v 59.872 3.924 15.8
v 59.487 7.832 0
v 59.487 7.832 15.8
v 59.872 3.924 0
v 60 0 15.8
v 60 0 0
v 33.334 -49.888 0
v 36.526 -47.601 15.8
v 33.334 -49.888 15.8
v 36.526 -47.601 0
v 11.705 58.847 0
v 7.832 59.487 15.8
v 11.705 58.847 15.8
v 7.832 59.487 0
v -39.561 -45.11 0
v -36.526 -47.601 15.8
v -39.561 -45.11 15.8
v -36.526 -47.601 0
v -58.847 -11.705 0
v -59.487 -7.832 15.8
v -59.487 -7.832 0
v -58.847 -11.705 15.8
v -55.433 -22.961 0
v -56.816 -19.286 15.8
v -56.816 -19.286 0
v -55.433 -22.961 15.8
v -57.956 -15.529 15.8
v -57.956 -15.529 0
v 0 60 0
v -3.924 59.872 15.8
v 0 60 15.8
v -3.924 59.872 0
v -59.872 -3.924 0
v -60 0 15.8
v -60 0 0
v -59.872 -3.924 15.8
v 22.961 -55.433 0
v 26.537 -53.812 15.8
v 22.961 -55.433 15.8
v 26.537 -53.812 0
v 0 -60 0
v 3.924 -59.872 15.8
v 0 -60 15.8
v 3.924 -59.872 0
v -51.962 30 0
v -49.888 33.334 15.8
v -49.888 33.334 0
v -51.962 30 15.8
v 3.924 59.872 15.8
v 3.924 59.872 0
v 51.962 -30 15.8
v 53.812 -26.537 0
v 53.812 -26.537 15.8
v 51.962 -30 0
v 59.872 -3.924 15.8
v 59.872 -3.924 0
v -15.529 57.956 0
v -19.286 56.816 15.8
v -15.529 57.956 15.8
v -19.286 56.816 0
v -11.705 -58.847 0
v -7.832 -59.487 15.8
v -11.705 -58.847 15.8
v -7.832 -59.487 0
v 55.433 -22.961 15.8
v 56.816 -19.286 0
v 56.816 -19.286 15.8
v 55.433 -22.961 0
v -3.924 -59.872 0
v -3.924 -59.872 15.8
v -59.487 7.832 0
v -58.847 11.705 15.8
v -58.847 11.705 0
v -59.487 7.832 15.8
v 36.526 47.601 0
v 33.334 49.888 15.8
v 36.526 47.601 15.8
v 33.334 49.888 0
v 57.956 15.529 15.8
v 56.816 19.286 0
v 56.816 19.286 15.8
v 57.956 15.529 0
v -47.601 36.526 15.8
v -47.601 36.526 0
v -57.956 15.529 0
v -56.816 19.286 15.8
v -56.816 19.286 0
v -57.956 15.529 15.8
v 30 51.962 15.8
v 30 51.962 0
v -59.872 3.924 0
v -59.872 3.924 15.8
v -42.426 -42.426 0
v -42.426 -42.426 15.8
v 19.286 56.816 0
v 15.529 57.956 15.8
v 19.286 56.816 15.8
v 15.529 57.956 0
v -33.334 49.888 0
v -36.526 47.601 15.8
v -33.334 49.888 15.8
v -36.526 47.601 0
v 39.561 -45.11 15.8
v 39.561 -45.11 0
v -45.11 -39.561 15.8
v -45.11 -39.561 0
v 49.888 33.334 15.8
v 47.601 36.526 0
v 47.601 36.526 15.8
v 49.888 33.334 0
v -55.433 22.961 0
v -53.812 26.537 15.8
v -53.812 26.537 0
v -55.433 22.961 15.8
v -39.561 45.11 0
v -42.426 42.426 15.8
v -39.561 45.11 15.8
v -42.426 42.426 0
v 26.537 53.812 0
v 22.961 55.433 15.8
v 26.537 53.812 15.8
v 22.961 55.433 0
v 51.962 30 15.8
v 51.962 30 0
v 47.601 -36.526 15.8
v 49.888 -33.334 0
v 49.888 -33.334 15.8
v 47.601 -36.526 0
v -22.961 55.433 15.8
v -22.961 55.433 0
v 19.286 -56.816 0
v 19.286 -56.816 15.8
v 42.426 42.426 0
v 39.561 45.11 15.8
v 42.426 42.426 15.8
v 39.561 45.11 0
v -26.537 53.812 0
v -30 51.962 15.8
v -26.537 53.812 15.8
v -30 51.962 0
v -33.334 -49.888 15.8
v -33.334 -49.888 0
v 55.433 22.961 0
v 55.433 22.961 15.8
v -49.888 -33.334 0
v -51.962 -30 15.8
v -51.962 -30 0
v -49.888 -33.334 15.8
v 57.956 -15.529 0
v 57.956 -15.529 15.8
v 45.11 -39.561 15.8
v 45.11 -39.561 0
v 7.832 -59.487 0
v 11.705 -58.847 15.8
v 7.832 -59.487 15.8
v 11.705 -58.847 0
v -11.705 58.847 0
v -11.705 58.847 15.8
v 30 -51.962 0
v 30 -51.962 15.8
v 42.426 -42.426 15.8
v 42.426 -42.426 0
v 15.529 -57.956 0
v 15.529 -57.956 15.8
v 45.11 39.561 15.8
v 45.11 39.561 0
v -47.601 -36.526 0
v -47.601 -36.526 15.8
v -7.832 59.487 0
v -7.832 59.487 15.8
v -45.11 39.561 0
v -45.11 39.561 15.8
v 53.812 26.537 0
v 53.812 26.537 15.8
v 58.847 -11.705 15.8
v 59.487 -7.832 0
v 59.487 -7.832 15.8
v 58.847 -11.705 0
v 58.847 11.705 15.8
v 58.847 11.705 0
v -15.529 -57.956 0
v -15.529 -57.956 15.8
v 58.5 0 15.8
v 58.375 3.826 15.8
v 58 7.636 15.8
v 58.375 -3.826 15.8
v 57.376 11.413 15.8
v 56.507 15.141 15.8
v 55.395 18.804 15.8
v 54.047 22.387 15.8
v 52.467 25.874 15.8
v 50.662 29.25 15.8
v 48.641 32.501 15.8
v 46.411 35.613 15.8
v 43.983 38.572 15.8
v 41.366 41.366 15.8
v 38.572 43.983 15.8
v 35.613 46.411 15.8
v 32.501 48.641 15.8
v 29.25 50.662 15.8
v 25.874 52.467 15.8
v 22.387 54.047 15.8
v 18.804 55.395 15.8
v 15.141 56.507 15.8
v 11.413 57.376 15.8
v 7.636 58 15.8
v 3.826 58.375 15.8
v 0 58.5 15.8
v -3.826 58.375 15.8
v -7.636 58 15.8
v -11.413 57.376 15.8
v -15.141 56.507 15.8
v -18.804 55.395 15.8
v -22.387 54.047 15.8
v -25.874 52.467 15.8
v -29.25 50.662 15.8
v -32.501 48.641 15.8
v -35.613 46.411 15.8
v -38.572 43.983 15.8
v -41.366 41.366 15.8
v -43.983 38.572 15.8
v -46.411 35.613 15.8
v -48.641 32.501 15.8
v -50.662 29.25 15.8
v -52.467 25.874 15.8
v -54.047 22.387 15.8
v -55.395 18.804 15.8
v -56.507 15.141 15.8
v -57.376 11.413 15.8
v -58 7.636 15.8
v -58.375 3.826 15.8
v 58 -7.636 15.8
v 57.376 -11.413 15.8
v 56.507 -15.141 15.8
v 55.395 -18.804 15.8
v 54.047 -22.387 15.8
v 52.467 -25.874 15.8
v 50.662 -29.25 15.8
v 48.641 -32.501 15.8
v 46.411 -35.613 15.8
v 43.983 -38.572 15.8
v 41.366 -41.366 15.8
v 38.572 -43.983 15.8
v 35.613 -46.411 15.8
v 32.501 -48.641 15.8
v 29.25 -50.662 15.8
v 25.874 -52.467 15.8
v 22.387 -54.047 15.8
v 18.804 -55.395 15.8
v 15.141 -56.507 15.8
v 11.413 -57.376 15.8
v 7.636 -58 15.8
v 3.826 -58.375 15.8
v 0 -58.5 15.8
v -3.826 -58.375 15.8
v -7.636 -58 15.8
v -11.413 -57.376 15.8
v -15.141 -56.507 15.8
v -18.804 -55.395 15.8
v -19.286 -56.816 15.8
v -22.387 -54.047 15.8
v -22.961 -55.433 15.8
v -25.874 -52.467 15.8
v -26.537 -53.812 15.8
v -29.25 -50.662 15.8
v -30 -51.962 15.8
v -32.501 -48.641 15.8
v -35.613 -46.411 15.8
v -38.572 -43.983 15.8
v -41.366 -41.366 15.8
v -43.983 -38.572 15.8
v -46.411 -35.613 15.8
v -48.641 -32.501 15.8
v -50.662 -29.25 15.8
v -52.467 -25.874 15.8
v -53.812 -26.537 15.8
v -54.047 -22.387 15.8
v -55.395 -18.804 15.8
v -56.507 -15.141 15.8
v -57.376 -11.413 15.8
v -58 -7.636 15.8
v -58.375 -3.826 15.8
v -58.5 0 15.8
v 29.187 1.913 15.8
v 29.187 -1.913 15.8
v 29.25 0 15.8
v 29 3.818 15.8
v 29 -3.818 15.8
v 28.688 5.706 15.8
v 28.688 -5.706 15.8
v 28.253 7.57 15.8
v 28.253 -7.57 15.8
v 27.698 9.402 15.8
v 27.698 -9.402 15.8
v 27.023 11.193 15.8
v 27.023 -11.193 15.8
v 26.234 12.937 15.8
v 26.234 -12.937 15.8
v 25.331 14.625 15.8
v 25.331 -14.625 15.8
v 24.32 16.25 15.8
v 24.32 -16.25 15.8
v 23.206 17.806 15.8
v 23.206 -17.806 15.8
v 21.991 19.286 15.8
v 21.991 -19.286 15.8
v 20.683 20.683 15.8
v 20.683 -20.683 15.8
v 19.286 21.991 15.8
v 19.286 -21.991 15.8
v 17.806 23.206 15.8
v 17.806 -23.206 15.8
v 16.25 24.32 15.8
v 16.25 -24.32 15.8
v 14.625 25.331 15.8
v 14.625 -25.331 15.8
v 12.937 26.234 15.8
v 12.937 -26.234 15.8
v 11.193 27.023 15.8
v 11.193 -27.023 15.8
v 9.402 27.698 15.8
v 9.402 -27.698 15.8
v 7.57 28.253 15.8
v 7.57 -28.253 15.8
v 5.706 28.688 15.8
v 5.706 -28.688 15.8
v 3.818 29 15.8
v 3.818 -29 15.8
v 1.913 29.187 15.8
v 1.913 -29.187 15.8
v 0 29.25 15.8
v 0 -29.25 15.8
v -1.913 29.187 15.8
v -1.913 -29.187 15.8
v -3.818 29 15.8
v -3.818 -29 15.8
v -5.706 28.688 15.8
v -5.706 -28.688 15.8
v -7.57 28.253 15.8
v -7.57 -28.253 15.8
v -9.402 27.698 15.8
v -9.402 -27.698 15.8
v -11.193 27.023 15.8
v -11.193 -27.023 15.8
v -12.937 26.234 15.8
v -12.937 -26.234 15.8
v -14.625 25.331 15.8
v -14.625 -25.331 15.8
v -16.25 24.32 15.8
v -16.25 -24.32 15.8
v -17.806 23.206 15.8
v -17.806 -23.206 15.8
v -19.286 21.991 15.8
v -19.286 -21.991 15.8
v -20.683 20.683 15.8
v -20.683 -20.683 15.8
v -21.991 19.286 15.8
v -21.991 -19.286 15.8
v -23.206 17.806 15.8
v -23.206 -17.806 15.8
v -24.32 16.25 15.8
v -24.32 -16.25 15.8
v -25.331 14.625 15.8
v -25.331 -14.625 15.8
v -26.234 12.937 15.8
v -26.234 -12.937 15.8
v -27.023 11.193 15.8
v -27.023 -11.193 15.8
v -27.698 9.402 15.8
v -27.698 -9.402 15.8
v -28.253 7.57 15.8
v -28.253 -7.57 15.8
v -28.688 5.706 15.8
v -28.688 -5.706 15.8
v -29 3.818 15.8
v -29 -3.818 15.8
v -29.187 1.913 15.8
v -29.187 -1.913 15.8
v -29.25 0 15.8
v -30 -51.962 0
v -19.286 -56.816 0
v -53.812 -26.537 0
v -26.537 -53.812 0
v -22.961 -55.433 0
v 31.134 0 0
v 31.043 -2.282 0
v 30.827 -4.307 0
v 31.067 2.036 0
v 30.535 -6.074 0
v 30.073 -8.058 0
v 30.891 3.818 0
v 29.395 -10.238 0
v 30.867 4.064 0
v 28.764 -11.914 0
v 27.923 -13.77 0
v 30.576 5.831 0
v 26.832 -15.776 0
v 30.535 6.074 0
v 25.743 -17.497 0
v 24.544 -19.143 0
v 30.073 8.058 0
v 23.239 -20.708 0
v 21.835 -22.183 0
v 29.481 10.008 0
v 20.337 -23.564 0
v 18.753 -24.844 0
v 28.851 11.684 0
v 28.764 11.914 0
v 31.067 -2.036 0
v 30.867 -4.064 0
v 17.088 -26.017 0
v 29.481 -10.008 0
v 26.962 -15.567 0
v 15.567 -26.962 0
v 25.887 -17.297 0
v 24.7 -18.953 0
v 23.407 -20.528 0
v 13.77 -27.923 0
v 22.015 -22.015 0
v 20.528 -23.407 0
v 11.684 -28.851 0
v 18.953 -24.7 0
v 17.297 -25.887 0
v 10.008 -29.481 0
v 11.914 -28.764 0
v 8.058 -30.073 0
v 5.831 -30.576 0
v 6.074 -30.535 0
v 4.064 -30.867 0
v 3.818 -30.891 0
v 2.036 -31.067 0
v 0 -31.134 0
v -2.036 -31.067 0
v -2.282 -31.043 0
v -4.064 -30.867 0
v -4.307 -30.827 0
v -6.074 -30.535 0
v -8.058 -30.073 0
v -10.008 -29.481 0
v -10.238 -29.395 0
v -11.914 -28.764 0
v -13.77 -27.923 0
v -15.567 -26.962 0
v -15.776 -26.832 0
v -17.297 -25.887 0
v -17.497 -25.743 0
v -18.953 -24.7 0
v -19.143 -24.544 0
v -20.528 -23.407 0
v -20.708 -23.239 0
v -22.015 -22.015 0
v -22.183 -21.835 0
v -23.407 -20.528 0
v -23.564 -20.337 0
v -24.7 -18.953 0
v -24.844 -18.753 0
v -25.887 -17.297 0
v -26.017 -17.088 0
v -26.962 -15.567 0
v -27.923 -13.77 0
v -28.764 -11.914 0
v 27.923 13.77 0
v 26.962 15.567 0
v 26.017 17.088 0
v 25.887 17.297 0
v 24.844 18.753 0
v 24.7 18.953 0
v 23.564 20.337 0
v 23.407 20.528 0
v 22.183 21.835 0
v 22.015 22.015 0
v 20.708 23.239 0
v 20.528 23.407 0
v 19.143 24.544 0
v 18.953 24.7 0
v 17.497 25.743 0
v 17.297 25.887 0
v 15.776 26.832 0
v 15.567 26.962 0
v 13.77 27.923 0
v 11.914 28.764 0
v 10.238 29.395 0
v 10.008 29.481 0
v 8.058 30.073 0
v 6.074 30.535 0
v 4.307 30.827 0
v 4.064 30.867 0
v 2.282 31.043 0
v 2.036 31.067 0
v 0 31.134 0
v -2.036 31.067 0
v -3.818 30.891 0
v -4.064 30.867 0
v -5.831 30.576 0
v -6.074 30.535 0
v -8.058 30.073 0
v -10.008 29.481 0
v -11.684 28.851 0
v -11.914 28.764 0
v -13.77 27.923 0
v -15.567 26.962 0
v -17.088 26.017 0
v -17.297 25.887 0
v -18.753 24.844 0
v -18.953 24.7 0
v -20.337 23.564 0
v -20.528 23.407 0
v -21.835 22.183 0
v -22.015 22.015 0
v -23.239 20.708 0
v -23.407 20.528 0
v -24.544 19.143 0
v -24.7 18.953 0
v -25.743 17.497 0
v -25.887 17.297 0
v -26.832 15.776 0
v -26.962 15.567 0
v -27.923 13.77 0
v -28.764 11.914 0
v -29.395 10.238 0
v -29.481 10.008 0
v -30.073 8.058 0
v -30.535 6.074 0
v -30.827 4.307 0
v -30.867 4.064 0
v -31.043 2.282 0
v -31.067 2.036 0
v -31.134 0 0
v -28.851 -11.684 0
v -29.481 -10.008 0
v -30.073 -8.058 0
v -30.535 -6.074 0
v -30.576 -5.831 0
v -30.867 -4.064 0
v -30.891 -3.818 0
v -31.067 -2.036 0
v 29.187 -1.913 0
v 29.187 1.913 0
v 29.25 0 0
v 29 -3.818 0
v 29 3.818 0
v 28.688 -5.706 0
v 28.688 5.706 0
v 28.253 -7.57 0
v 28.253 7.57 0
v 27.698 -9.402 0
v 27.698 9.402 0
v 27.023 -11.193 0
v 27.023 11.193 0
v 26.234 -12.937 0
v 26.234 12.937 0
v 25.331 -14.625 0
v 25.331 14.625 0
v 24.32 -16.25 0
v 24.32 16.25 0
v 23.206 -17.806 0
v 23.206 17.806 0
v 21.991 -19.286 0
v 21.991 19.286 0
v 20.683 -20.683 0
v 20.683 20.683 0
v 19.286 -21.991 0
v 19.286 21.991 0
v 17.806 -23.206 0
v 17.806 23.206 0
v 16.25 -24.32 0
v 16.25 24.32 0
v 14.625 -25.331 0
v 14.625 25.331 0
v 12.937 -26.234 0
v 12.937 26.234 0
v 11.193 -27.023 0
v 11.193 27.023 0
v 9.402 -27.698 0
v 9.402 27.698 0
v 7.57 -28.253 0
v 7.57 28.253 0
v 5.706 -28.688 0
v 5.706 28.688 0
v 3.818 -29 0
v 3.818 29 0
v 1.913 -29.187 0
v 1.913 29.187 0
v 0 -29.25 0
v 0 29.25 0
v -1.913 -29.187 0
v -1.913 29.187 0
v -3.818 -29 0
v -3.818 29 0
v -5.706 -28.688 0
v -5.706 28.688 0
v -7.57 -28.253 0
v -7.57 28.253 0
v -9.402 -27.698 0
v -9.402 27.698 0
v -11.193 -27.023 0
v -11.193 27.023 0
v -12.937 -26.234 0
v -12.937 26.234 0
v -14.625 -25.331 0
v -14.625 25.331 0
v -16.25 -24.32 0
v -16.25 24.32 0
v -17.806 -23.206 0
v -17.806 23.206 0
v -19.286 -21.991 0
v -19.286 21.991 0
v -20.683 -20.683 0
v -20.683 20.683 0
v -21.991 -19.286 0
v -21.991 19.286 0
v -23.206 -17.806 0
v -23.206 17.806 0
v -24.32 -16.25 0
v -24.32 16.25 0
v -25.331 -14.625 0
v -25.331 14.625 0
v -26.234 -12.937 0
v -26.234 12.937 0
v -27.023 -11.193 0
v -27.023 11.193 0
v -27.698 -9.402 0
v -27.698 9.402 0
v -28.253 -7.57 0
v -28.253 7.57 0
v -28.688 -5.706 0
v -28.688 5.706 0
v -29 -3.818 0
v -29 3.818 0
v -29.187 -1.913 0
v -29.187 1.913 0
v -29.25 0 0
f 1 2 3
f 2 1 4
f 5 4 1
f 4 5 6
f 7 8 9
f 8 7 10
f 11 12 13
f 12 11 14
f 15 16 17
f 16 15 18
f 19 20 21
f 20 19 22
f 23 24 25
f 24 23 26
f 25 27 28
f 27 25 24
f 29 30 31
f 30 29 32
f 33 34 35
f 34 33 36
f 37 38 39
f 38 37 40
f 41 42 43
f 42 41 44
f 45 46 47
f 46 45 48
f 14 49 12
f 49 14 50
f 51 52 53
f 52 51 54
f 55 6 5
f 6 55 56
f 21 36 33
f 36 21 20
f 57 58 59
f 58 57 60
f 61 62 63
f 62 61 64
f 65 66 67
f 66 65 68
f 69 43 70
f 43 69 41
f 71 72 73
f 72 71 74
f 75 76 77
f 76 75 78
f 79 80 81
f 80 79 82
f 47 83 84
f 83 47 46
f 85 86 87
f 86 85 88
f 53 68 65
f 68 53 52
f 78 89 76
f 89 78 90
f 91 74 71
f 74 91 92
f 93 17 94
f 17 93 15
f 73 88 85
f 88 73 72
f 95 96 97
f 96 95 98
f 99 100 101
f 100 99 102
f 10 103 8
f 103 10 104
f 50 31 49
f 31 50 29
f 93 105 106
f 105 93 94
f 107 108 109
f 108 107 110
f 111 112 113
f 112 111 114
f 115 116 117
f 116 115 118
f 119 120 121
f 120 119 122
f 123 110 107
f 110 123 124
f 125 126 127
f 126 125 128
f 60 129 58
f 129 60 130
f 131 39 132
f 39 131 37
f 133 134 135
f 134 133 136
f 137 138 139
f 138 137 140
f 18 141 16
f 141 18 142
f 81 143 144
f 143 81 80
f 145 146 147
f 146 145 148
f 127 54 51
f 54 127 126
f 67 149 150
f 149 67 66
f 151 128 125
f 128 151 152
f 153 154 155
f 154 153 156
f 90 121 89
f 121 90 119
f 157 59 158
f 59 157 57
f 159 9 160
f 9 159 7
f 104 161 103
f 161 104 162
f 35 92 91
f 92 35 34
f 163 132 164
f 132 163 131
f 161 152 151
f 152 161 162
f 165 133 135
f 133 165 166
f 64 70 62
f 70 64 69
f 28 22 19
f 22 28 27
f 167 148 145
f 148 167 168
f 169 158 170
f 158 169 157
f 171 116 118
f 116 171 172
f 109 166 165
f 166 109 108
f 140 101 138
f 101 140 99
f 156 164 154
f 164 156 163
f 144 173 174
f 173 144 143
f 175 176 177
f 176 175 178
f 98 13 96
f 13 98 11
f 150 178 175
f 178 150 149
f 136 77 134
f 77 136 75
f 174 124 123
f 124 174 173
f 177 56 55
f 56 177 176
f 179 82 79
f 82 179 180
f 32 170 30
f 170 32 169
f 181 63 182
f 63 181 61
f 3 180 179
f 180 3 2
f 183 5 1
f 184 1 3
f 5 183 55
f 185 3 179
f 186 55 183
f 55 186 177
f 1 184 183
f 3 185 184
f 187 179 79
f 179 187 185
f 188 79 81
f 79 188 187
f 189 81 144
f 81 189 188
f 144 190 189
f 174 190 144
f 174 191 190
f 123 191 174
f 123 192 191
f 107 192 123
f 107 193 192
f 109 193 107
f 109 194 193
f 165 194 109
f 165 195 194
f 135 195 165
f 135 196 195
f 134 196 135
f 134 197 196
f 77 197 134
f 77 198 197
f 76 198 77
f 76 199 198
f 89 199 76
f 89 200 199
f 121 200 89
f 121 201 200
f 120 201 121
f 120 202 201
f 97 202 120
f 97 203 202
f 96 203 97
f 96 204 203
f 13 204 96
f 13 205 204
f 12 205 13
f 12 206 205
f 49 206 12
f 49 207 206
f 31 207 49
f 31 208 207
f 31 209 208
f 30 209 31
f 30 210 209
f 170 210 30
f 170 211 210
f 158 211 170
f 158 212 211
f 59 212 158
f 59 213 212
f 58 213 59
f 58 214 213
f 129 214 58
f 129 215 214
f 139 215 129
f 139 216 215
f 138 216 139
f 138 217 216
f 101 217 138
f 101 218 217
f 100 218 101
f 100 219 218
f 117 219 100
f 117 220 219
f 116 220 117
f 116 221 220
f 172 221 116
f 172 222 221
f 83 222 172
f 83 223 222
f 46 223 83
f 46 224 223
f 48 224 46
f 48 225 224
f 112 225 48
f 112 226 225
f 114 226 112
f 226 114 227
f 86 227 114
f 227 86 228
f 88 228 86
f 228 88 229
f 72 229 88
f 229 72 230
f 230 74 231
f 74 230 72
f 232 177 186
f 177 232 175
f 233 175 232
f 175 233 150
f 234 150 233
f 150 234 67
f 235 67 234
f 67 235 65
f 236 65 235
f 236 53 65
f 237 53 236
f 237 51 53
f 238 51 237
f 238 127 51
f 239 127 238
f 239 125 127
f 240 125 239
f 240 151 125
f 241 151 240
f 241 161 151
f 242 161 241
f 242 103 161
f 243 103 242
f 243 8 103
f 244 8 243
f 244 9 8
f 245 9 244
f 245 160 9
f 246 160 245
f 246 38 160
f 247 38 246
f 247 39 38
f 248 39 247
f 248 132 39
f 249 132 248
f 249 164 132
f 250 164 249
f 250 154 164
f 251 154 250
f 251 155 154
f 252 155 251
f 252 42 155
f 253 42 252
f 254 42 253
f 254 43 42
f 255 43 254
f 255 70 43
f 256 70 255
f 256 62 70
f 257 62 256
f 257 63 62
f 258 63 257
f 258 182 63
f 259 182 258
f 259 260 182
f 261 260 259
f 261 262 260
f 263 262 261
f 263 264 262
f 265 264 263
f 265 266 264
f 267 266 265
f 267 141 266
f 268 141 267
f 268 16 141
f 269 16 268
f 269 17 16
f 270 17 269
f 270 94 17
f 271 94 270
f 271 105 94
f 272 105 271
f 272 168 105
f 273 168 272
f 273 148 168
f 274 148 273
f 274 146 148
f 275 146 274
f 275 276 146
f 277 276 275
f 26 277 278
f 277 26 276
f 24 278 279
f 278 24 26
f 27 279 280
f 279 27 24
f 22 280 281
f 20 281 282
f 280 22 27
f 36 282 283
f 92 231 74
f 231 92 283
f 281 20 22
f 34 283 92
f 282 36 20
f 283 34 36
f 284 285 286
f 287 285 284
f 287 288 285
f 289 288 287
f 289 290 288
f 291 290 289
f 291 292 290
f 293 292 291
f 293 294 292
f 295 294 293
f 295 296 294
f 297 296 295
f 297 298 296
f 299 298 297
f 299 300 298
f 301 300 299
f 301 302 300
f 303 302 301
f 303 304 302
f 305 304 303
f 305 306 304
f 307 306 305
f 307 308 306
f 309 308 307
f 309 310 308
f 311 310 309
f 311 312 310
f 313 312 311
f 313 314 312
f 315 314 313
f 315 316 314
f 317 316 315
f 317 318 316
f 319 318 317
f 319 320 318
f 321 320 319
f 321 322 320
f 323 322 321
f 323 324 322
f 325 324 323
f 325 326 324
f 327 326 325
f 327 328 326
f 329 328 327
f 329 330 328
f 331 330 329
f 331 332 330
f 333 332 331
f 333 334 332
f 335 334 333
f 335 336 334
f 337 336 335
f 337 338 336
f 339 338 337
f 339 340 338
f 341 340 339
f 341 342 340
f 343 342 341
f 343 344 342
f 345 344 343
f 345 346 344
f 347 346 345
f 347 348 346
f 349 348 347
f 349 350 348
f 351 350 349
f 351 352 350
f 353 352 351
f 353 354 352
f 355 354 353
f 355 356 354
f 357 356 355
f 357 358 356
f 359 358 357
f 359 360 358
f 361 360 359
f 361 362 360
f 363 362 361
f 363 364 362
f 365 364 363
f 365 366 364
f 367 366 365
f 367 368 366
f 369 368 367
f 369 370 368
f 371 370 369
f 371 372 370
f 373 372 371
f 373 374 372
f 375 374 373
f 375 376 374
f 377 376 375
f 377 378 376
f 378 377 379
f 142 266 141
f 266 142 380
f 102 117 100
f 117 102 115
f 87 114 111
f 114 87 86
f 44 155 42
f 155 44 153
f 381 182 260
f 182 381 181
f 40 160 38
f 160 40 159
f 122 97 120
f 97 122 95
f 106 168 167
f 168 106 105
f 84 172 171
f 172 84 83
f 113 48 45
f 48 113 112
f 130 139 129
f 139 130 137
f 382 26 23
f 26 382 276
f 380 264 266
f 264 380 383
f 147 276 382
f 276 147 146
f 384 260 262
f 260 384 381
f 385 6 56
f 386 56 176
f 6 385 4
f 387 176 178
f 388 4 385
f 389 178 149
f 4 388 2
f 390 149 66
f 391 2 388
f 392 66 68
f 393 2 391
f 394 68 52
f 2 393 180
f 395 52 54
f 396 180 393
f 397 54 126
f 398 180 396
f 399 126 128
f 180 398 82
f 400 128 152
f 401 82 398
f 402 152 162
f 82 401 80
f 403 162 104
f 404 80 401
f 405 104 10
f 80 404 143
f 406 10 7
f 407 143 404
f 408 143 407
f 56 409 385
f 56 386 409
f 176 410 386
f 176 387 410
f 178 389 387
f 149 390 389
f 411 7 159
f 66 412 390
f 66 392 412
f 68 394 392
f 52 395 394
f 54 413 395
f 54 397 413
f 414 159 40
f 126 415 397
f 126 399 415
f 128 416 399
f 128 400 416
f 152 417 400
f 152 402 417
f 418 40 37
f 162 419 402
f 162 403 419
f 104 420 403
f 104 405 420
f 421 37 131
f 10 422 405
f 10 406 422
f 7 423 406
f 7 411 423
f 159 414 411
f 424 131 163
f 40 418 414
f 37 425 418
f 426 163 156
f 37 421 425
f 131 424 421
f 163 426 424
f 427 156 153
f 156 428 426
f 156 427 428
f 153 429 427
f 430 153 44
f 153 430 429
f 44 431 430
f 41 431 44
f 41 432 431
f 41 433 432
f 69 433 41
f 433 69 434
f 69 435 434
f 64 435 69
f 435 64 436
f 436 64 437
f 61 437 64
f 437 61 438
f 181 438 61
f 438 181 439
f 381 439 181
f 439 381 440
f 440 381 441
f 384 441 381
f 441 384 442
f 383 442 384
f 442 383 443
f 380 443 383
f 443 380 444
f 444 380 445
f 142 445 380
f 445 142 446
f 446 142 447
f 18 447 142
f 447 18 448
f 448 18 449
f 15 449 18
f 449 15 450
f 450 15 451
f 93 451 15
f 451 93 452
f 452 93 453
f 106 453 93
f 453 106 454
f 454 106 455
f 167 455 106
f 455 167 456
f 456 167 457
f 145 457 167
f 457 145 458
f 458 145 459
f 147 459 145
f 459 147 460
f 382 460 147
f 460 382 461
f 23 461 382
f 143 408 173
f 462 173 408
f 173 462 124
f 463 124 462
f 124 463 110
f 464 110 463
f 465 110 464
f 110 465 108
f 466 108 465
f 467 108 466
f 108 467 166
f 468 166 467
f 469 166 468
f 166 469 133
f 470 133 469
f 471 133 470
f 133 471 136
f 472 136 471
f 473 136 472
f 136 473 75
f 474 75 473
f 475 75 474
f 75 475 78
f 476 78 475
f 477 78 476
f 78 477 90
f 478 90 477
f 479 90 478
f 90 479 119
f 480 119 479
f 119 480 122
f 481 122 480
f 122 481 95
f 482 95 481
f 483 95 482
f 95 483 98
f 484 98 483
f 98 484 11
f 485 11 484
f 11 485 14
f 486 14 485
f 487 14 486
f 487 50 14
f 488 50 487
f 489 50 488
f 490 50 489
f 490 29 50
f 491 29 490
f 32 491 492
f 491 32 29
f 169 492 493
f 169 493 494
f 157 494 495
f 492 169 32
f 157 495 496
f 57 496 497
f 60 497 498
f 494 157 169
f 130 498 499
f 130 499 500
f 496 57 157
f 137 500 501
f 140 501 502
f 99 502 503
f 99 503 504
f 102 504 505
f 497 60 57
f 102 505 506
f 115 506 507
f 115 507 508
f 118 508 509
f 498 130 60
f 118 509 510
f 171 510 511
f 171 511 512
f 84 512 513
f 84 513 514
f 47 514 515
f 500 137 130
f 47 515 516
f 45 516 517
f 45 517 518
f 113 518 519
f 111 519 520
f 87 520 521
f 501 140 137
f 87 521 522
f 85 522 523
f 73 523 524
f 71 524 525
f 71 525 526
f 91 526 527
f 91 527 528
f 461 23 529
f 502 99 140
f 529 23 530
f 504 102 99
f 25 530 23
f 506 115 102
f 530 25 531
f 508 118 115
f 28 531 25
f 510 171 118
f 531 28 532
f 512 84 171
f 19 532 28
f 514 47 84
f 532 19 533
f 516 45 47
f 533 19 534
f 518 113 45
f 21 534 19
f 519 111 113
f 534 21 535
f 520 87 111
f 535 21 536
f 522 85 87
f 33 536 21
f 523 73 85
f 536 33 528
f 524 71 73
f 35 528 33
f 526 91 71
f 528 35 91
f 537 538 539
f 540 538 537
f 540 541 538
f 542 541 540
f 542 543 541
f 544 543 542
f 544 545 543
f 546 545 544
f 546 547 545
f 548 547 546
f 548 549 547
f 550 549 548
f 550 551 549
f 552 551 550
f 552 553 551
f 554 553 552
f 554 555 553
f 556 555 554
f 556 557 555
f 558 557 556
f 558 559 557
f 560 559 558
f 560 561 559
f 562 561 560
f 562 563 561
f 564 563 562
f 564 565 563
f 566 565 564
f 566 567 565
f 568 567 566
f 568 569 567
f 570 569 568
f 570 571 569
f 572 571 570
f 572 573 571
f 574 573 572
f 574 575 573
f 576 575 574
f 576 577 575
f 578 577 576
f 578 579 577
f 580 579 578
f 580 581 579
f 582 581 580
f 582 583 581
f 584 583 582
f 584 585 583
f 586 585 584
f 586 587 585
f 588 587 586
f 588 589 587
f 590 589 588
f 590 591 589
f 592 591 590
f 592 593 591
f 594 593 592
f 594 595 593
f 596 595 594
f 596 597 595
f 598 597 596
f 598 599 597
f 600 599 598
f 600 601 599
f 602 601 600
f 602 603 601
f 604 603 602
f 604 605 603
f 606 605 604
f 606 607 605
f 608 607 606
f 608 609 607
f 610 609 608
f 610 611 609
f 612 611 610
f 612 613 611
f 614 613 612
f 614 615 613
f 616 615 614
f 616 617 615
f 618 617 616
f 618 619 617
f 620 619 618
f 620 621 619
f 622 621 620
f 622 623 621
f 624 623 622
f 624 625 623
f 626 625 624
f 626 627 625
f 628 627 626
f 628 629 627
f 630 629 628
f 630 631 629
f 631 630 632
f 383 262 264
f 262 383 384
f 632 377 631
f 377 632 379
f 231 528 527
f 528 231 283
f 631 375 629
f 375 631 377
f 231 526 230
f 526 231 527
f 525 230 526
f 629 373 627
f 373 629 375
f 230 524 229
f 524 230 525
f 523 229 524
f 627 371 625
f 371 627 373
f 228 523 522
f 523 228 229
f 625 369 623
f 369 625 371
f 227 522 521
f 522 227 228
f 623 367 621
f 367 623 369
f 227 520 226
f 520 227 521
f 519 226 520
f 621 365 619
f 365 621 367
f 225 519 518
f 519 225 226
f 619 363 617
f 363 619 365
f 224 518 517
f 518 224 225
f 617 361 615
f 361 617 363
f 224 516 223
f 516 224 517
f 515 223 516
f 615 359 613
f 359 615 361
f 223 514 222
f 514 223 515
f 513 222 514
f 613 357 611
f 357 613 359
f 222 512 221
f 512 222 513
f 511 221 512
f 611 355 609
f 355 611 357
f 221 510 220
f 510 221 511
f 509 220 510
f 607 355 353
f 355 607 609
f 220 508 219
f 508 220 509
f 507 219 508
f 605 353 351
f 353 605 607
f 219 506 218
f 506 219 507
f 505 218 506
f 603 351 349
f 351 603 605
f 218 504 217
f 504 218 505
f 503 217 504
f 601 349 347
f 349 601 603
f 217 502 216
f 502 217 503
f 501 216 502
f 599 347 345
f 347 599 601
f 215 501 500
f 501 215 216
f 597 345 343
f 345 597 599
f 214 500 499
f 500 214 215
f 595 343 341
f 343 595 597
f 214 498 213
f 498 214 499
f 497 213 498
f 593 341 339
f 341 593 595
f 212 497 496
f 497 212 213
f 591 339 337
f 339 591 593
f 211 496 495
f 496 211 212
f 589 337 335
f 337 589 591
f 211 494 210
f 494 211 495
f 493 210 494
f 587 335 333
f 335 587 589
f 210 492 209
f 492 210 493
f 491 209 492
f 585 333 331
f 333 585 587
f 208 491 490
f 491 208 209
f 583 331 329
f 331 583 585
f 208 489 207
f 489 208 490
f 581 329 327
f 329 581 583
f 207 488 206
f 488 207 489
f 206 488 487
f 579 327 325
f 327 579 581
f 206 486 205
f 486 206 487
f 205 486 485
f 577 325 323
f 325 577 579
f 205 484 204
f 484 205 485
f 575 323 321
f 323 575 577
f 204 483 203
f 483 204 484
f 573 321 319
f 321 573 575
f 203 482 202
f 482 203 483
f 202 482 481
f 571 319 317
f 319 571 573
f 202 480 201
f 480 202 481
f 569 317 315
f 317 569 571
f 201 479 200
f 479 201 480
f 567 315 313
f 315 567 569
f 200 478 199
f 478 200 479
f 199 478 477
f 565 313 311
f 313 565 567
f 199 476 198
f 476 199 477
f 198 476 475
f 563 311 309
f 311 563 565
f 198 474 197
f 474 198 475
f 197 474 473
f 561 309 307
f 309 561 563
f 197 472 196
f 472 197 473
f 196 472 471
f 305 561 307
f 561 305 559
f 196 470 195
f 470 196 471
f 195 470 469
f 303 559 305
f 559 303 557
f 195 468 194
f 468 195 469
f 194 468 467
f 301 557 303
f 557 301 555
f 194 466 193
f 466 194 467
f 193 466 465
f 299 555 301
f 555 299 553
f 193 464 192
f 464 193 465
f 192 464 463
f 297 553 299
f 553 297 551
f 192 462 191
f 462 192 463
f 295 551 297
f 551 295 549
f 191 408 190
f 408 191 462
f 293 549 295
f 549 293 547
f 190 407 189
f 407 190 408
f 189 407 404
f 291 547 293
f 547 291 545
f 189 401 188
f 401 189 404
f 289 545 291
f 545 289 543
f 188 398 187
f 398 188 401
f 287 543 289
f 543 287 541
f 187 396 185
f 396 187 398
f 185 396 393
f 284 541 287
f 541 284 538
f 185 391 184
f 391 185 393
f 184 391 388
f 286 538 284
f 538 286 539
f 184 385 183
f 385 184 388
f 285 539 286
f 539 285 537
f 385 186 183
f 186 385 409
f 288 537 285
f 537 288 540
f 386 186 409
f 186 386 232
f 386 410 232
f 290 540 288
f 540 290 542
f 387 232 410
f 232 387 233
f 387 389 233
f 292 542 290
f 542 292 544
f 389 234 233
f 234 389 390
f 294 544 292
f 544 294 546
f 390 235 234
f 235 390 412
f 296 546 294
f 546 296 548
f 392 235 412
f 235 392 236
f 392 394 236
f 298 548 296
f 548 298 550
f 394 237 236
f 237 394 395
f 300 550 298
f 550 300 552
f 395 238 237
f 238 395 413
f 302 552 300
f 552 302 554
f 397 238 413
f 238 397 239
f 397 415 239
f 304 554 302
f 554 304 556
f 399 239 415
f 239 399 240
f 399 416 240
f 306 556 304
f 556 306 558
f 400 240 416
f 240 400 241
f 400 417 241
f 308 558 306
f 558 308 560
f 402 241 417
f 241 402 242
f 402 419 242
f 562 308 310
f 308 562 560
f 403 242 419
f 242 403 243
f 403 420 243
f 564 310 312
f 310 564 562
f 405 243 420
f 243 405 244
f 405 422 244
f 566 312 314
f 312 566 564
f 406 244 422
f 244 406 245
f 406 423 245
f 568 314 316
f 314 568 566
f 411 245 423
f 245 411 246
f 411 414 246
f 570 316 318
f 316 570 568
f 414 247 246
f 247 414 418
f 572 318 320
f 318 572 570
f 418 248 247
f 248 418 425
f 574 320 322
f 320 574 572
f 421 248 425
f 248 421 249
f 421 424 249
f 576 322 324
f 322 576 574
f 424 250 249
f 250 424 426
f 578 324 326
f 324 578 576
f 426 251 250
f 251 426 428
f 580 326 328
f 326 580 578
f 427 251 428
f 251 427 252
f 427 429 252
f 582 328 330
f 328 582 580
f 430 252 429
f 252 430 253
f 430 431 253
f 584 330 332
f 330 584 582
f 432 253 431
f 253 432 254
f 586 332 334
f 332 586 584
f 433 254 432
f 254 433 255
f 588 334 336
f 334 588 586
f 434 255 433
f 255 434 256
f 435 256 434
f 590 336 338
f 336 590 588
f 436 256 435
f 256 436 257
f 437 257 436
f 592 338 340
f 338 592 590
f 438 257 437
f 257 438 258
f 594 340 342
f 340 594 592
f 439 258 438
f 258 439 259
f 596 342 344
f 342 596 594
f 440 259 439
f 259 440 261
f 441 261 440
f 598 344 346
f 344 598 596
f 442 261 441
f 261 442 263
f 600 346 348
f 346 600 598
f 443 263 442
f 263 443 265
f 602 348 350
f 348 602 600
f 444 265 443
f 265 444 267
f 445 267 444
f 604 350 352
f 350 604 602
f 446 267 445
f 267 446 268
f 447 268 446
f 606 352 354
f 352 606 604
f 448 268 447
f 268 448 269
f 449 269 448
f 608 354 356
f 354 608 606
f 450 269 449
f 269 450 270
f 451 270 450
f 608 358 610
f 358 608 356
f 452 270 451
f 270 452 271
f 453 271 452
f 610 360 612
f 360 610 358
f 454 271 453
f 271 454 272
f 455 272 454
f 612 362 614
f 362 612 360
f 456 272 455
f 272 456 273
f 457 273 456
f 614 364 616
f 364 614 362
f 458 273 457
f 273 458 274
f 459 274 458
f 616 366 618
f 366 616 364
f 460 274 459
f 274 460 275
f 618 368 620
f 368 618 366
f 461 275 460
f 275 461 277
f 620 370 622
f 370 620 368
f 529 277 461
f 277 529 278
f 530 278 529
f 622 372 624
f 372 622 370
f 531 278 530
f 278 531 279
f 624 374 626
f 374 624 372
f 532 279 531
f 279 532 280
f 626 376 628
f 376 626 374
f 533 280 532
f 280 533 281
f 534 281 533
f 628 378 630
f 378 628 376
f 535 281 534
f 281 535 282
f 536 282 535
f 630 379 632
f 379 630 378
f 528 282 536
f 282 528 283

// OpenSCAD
$fn=96;

//Top vars
top_dia = 120;
top_height_min = 2.2;
top_height_max = 15.8;
top_height_center = 4.6-top_height_min;

top_center_hole_dia = 31.6;
top_center_indent_dia = 57-18;
top_center_indent_height = 13.2;

top_inside_lip_height = 5.5-3.1;
top_inside_lip_width = 2.4;
top_inside_lip_outer_dia = 32.4;
top_inside_lip_inner_dia = 27.6;

top_center_cone_height = 13.3;
top_center_cone_max_dia = 74.5;
top_center_cone_min_dia = 51.1;

top_outside_lip_height = 5.3;
top_outside_lip_outer_dia = 108.4;
top_outside_lip_width = 2.2;
top_outside_lip_inner_dia = top_outside_lip_outer_dia-2.5;

sip_hole_outer_dia = 6;
sip_hole_height = 5.3;
sip_hole_inner_dia = 3.8;

difference()
{
  union()
  {
    cylinder( h = top_height_max, d = top_dia);
  }
    
  #rotate_extrude(convexity = 10)
  translate([top_center_indent_dia, top_height_max])
    circle(d = top_center_indent_dia, $fn = 3);
  
}


/*  
      //Sip holes
    translate([0, 0, -top_height_min/2+sip_hole_height/2-.2])
      make_ring_of(radius = 97.6/2, count = 8)
    cylinder( h = sip_hole_height, d = sip_hole_inner_dia, center = true, $fn=92);
}

*/


module make_ring_of(radius, count)
{
    for (a = [0 : count - 1]) {
        angle = a * 360 / count;
        translate(radius * [sin(angle), -cos(angle), 0])
            rotate([0, 0, angle])
                children();
    }
}
